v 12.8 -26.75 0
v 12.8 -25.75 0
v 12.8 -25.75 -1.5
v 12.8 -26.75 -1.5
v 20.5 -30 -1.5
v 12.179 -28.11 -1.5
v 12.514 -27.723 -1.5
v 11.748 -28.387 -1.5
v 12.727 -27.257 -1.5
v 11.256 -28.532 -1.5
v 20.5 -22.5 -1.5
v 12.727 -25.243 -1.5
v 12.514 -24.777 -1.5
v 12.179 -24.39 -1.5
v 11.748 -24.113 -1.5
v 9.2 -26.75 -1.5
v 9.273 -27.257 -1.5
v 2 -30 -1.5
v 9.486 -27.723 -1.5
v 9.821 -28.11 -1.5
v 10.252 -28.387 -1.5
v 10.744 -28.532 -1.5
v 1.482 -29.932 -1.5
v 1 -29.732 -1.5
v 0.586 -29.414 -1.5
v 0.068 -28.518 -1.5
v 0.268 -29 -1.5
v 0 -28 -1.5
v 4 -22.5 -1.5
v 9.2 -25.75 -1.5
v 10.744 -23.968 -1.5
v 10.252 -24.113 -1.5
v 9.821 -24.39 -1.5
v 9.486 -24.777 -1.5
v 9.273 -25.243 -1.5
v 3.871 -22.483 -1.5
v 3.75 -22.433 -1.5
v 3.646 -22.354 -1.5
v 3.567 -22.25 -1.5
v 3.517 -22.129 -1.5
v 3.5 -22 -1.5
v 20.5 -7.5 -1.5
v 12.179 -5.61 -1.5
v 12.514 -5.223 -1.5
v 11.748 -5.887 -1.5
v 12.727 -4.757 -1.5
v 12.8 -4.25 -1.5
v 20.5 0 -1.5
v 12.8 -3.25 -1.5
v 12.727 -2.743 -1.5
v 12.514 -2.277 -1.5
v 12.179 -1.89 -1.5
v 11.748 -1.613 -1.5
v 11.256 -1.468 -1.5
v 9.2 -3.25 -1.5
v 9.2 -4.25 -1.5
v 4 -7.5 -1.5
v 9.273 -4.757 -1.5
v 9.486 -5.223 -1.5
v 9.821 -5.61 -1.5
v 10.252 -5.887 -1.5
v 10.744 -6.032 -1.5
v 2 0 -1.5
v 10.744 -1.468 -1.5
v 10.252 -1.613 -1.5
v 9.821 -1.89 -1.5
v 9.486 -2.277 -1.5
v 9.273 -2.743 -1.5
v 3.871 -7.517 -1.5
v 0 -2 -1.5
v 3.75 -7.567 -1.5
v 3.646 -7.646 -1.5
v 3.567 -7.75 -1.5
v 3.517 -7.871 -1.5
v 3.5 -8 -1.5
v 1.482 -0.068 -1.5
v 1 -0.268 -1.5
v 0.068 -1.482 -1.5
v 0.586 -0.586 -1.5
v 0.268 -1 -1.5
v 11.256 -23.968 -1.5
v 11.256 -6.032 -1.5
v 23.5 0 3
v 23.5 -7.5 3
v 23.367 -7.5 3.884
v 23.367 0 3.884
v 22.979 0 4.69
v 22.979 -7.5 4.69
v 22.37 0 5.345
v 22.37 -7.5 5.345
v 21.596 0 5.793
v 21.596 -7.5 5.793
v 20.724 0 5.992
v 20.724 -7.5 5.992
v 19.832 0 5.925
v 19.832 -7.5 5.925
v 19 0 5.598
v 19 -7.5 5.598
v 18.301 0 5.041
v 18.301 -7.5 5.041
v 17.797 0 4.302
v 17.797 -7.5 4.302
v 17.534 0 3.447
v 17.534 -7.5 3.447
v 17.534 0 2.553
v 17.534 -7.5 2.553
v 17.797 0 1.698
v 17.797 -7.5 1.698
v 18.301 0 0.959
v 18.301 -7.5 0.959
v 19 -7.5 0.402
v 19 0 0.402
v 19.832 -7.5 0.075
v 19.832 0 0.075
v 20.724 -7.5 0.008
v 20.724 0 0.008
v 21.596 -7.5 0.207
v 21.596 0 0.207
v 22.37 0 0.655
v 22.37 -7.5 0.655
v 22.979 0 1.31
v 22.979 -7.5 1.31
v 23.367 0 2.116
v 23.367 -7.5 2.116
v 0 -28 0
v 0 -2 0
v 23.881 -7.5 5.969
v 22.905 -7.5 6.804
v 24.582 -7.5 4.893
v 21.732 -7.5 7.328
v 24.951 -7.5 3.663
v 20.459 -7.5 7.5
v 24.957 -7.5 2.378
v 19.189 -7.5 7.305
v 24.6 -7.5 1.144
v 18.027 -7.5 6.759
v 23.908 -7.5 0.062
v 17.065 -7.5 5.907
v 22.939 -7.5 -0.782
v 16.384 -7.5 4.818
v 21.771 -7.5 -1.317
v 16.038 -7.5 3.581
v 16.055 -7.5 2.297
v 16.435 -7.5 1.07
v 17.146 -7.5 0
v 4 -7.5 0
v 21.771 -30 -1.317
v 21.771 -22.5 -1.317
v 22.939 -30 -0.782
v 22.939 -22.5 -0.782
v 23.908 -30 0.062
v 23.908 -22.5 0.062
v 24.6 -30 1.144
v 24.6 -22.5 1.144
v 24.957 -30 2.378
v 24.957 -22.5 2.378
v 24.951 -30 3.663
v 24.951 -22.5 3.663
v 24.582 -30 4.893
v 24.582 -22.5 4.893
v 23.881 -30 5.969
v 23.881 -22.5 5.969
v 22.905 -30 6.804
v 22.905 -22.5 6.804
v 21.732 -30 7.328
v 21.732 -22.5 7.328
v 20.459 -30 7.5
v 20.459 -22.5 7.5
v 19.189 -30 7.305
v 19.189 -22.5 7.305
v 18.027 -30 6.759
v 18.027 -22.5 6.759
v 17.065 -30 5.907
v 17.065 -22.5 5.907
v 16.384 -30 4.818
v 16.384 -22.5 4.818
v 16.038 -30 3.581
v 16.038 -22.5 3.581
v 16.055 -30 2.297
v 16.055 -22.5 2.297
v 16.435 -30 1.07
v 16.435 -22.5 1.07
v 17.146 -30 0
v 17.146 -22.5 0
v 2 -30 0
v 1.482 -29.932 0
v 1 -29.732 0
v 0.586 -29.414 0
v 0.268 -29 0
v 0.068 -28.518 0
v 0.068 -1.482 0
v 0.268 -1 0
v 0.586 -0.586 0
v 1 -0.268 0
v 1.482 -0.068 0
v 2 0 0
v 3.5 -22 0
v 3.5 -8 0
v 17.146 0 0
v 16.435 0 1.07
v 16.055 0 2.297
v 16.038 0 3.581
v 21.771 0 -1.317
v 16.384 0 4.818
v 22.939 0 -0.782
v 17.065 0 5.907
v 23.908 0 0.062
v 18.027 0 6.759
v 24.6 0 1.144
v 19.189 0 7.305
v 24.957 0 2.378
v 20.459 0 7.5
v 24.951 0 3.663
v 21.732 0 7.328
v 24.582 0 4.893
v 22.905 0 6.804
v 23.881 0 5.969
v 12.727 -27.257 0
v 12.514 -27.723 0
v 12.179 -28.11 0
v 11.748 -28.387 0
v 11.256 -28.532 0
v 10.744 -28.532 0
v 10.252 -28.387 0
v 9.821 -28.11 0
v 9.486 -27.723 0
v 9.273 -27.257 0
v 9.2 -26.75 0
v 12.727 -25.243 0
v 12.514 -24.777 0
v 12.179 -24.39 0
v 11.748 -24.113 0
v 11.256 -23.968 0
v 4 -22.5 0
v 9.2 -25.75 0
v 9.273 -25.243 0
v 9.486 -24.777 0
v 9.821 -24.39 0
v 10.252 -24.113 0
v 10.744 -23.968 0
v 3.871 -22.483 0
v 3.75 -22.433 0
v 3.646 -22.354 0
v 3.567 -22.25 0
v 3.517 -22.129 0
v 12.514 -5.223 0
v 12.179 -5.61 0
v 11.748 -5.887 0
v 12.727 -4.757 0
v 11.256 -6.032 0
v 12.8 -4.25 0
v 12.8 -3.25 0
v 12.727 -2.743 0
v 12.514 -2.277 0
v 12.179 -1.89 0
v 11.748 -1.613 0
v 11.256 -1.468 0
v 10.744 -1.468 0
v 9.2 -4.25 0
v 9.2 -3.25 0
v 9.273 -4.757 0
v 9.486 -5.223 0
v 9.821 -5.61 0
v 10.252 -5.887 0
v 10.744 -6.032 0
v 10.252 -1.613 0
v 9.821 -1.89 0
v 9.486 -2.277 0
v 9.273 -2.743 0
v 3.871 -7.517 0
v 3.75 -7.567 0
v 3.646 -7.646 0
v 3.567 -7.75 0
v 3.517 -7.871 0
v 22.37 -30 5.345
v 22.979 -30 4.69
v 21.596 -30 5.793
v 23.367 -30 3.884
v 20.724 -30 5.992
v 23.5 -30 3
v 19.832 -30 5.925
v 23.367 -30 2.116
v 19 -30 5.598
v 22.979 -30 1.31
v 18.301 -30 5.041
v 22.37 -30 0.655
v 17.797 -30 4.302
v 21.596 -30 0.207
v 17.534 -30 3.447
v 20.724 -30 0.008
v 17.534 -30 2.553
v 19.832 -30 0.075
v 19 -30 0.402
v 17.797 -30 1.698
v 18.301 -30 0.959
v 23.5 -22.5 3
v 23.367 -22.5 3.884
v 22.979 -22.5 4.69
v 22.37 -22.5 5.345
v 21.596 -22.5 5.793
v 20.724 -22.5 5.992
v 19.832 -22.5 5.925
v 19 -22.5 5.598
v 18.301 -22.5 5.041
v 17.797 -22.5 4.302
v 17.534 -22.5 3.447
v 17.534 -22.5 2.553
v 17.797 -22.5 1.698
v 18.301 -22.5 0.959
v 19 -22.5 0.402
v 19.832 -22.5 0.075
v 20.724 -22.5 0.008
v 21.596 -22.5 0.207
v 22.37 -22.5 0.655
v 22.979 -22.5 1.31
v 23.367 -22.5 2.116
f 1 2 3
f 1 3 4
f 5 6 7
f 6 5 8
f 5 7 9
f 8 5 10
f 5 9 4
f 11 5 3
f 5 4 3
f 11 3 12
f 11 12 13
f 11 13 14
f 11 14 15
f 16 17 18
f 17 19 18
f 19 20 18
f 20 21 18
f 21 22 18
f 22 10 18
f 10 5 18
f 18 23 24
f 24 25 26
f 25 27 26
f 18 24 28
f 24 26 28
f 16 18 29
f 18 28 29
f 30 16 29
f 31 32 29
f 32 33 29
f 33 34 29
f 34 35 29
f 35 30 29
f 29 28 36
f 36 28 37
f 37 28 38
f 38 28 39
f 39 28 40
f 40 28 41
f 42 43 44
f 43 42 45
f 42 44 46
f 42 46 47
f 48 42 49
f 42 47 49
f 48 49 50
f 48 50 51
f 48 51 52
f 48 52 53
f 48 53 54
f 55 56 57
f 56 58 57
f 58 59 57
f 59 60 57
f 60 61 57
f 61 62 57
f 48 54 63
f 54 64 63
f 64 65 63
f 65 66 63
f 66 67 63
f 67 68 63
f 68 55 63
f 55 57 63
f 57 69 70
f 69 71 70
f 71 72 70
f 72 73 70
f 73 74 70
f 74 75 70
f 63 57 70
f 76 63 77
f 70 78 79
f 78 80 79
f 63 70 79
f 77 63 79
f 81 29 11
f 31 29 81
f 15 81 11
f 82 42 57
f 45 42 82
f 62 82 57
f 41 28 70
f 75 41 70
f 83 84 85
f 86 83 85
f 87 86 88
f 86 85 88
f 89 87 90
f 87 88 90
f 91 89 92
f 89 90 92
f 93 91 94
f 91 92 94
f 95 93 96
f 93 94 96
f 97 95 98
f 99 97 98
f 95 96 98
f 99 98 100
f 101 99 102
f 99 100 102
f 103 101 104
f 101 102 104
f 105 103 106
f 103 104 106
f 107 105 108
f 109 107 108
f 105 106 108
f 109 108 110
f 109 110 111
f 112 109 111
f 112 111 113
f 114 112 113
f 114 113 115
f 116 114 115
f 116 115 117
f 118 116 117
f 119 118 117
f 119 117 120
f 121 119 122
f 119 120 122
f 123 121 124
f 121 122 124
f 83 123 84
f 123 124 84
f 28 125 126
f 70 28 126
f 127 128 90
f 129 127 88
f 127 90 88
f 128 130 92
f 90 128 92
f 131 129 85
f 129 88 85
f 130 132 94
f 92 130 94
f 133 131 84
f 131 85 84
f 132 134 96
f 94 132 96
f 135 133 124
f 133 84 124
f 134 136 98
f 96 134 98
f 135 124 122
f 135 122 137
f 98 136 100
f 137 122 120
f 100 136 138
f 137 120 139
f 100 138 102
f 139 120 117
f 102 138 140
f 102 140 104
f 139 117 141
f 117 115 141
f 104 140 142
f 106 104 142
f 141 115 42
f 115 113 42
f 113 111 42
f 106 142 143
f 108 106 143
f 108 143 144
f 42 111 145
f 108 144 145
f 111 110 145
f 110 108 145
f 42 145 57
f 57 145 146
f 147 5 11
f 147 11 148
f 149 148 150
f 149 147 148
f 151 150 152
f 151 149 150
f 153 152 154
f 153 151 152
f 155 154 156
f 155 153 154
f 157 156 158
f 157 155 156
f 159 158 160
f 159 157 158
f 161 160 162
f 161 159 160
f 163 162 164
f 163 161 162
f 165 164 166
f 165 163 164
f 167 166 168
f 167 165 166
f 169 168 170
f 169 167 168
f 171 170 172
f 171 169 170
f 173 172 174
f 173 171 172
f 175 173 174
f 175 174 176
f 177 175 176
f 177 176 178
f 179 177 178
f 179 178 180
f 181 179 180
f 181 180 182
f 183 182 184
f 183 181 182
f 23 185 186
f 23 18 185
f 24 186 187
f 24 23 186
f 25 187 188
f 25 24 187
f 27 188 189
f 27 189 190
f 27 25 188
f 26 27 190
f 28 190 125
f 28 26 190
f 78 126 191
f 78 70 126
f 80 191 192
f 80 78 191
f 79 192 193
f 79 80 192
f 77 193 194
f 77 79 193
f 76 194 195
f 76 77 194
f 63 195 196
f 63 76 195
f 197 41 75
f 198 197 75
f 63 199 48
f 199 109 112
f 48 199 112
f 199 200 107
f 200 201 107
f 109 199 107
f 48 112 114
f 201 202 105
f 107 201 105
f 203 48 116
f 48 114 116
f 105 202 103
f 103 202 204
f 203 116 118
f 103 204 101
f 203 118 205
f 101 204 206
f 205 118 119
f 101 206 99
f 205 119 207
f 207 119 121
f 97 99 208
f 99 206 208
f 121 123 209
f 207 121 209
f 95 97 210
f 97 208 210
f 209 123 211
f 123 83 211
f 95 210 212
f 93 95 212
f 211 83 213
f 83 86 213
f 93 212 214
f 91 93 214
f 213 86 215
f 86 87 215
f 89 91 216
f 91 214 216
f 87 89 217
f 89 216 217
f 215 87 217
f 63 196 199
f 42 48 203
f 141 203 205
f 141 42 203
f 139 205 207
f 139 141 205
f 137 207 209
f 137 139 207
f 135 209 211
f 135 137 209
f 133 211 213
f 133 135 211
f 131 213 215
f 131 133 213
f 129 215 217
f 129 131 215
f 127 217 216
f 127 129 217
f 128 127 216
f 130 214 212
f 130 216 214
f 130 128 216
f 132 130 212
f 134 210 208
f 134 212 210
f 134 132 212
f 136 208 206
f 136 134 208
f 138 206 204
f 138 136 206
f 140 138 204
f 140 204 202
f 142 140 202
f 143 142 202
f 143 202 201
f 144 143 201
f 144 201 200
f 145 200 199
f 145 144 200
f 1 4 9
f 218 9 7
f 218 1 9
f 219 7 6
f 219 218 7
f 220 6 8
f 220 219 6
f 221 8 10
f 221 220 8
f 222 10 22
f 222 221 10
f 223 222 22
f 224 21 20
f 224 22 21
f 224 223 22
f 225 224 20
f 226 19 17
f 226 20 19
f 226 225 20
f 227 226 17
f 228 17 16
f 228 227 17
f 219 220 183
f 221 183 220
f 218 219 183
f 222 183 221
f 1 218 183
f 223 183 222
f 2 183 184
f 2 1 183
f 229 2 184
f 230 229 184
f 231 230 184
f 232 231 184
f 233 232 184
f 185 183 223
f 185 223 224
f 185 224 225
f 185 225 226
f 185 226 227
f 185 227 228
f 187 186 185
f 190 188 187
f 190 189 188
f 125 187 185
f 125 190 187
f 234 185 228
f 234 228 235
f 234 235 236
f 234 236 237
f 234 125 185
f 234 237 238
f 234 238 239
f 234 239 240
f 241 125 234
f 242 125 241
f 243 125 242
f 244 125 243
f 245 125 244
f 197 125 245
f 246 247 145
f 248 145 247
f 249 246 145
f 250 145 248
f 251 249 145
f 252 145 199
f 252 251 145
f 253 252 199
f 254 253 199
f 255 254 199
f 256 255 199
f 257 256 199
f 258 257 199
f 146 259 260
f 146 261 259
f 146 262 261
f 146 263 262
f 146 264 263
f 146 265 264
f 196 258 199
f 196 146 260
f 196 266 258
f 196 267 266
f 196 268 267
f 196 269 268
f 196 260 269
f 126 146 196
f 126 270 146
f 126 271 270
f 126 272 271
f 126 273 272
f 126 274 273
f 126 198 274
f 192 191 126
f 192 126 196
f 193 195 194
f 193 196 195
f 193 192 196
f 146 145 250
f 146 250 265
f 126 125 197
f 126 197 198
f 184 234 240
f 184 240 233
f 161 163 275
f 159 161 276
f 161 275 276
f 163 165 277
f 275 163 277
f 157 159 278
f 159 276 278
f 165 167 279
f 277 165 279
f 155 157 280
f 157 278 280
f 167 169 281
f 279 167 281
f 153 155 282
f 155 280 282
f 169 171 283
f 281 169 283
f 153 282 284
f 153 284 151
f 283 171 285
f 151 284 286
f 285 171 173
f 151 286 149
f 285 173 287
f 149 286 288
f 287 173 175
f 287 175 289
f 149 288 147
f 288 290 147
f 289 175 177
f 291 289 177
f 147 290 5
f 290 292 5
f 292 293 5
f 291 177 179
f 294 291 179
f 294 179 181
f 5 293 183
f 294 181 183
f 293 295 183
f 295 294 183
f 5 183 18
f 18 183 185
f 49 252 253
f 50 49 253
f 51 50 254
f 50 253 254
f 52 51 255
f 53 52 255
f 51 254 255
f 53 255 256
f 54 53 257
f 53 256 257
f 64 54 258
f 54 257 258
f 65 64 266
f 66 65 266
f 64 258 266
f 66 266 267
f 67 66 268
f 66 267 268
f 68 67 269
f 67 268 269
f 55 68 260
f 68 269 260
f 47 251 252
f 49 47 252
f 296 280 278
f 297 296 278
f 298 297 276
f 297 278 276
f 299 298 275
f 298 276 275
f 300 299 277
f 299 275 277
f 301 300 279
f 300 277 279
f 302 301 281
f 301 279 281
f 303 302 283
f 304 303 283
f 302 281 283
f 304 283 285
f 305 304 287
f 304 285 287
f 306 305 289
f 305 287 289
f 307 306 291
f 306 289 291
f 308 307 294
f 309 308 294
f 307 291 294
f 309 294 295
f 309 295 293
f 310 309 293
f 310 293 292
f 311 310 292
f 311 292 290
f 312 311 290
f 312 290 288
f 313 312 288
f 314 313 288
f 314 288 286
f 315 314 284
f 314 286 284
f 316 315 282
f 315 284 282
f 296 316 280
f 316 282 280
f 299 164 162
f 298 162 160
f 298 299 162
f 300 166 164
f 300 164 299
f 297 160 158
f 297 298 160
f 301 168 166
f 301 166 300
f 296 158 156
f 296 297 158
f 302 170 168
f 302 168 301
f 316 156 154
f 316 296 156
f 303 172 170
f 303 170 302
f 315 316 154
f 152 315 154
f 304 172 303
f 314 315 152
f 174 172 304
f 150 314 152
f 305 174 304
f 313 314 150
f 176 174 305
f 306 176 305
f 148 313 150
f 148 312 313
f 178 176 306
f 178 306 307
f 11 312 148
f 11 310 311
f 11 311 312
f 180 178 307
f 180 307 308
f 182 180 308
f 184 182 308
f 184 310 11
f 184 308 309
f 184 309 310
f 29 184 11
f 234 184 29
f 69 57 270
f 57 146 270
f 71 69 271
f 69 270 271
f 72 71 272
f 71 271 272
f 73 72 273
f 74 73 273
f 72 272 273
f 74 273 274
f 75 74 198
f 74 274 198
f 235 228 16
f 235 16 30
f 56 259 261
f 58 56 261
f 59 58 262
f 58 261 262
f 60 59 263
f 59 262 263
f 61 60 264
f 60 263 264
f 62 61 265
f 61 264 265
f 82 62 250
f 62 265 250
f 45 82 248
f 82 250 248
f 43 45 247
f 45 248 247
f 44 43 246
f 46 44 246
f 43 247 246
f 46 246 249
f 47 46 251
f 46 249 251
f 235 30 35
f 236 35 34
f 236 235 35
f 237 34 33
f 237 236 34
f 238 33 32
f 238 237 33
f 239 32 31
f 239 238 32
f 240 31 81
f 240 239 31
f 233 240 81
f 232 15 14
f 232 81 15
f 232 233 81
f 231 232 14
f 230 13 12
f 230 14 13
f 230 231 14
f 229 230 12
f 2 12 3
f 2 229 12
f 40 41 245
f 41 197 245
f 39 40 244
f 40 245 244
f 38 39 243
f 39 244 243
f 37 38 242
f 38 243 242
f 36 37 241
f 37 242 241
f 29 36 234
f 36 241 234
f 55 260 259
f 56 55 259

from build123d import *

# Parameters (mm, degrees)
SKETCH_2_W             = 16
SKETCH_2_H             = 30
SM_BASE_FLANGE_1_DEPTH = 1.5
SKETCH_7_R             = 4.5
SKETCH_7_R_2           = 3
EXTRUDE_1_DEPTH        = 30
SKETCH_8_W             = 1.5
SKETCH_8_H             = 7.5
EXTRUDE_1_2_DEPTH      = 4.5
SKETCH_9_W             = 25
SKETCH_9_H             = 15
CUT_EXTRUDE_1_DEPTH    = 41.074929819
FILLET_1_R             = 2
CUT_EXTRUDE_2_DEPTH    = 10
FILLET_2_R             = 0.5


# Sheet-metal steps are written as plain solids
with BuildPart() as part:
    # Sketch 2 → Базовая кромка1 (new body)
    with BuildSketch(Plane.XY):
        with Locations((8, -15)):
            Rectangle(SKETCH_2_W, SKETCH_2_H)
    extrude(amount=-SM_BASE_FLANGE_1_DEPTH)



with BuildPart() as body_2:
    # Эскиз7 → Extrude 1 (new body)
    with BuildSketch(Plane.XZ.offset(30)):
        with Locations((20.5, 3)):
            Circle(SKETCH_7_R)
        with Locations((20.5, 3)):
            Circle(SKETCH_7_R_2, mode=Mode.SUBTRACT)
    extrude(amount=-EXTRUDE_1_DEPTH)


with BuildPart() as part_1:
    add(part.part)

    add(body_2.part)  # Extrude 1 2 merges body 2
    # Эскиз8 → Extrude 1 2 (add)
    with BuildSketch(Plane(origin=(16, 0, 0), x_dir=(0, 0, -1), z_dir=(1, 0, 0))):
        with Locations((0.75, -26.25)):
            Rectangle(SKETCH_8_W, SKETCH_8_H)
        with Locations((0.75, -3.75)):
            Rectangle(SKETCH_8_W, SKETCH_8_H)
    extrude(amount=EXTRUDE_1_2_DEPTH)

    # Эскиз9 → Вырез-Вытянуть1 (cut, through all)
    with BuildSketch(Plane.XY.offset(-1.5)):
        with Locations((16, -15)):
            Rectangle(SKETCH_9_W, SKETCH_9_H)
    extrude(amount=CUT_EXTRUDE_1_DEPTH, mode=Mode.SUBTRACT)

    # Скругление1
    fillet_1_edges = [part_1.edges().sort_by_distance(p)[0] for p in [
        (0, 0, -0.75),
        (0, -30, -0.75),
    ]]
    fillet(fillet_1_edges, radius=FILLET_1_R)

    # Эскиз10 → Вырез-Вытянуть2 (cut)
    with BuildSketch(Plane.XY):
        with BuildLine():
            Line((9.2, -26.75), (9.2, -25.75))
            ThreePointArc((9.2, -25.75), (11, -23.95), (12.8, -25.75))
            Line((12.8, -25.75), (12.8, -26.75))
            ThreePointArc((12.8, -26.75), (11, -28.55), (9.2, -26.75))
        make_face()
        with BuildLine():
            Line((9.2, -3.25), (9.2, -4.25))
            ThreePointArc((9.2, -4.25), (11, -6.05), (12.8, -4.25))
            Line((12.8, -4.25), (12.8, -3.25))
            ThreePointArc((12.8, -3.25), (11, -1.45), (9.2, -3.25))
        make_face()
    extrude(amount=-CUT_EXTRUDE_2_DEPTH, mode=Mode.SUBTRACT)

    # Скругление2
    fillet_2_edges = [part_1.edges().sort_by_distance(p)[0] for p in [
        (3.5, -22.5, -0.75),
        (3.5, -7.5, -0.75),
    ]]
    fillet(fillet_2_edges, radius=FILLET_2_R)


solid = part_1.part
